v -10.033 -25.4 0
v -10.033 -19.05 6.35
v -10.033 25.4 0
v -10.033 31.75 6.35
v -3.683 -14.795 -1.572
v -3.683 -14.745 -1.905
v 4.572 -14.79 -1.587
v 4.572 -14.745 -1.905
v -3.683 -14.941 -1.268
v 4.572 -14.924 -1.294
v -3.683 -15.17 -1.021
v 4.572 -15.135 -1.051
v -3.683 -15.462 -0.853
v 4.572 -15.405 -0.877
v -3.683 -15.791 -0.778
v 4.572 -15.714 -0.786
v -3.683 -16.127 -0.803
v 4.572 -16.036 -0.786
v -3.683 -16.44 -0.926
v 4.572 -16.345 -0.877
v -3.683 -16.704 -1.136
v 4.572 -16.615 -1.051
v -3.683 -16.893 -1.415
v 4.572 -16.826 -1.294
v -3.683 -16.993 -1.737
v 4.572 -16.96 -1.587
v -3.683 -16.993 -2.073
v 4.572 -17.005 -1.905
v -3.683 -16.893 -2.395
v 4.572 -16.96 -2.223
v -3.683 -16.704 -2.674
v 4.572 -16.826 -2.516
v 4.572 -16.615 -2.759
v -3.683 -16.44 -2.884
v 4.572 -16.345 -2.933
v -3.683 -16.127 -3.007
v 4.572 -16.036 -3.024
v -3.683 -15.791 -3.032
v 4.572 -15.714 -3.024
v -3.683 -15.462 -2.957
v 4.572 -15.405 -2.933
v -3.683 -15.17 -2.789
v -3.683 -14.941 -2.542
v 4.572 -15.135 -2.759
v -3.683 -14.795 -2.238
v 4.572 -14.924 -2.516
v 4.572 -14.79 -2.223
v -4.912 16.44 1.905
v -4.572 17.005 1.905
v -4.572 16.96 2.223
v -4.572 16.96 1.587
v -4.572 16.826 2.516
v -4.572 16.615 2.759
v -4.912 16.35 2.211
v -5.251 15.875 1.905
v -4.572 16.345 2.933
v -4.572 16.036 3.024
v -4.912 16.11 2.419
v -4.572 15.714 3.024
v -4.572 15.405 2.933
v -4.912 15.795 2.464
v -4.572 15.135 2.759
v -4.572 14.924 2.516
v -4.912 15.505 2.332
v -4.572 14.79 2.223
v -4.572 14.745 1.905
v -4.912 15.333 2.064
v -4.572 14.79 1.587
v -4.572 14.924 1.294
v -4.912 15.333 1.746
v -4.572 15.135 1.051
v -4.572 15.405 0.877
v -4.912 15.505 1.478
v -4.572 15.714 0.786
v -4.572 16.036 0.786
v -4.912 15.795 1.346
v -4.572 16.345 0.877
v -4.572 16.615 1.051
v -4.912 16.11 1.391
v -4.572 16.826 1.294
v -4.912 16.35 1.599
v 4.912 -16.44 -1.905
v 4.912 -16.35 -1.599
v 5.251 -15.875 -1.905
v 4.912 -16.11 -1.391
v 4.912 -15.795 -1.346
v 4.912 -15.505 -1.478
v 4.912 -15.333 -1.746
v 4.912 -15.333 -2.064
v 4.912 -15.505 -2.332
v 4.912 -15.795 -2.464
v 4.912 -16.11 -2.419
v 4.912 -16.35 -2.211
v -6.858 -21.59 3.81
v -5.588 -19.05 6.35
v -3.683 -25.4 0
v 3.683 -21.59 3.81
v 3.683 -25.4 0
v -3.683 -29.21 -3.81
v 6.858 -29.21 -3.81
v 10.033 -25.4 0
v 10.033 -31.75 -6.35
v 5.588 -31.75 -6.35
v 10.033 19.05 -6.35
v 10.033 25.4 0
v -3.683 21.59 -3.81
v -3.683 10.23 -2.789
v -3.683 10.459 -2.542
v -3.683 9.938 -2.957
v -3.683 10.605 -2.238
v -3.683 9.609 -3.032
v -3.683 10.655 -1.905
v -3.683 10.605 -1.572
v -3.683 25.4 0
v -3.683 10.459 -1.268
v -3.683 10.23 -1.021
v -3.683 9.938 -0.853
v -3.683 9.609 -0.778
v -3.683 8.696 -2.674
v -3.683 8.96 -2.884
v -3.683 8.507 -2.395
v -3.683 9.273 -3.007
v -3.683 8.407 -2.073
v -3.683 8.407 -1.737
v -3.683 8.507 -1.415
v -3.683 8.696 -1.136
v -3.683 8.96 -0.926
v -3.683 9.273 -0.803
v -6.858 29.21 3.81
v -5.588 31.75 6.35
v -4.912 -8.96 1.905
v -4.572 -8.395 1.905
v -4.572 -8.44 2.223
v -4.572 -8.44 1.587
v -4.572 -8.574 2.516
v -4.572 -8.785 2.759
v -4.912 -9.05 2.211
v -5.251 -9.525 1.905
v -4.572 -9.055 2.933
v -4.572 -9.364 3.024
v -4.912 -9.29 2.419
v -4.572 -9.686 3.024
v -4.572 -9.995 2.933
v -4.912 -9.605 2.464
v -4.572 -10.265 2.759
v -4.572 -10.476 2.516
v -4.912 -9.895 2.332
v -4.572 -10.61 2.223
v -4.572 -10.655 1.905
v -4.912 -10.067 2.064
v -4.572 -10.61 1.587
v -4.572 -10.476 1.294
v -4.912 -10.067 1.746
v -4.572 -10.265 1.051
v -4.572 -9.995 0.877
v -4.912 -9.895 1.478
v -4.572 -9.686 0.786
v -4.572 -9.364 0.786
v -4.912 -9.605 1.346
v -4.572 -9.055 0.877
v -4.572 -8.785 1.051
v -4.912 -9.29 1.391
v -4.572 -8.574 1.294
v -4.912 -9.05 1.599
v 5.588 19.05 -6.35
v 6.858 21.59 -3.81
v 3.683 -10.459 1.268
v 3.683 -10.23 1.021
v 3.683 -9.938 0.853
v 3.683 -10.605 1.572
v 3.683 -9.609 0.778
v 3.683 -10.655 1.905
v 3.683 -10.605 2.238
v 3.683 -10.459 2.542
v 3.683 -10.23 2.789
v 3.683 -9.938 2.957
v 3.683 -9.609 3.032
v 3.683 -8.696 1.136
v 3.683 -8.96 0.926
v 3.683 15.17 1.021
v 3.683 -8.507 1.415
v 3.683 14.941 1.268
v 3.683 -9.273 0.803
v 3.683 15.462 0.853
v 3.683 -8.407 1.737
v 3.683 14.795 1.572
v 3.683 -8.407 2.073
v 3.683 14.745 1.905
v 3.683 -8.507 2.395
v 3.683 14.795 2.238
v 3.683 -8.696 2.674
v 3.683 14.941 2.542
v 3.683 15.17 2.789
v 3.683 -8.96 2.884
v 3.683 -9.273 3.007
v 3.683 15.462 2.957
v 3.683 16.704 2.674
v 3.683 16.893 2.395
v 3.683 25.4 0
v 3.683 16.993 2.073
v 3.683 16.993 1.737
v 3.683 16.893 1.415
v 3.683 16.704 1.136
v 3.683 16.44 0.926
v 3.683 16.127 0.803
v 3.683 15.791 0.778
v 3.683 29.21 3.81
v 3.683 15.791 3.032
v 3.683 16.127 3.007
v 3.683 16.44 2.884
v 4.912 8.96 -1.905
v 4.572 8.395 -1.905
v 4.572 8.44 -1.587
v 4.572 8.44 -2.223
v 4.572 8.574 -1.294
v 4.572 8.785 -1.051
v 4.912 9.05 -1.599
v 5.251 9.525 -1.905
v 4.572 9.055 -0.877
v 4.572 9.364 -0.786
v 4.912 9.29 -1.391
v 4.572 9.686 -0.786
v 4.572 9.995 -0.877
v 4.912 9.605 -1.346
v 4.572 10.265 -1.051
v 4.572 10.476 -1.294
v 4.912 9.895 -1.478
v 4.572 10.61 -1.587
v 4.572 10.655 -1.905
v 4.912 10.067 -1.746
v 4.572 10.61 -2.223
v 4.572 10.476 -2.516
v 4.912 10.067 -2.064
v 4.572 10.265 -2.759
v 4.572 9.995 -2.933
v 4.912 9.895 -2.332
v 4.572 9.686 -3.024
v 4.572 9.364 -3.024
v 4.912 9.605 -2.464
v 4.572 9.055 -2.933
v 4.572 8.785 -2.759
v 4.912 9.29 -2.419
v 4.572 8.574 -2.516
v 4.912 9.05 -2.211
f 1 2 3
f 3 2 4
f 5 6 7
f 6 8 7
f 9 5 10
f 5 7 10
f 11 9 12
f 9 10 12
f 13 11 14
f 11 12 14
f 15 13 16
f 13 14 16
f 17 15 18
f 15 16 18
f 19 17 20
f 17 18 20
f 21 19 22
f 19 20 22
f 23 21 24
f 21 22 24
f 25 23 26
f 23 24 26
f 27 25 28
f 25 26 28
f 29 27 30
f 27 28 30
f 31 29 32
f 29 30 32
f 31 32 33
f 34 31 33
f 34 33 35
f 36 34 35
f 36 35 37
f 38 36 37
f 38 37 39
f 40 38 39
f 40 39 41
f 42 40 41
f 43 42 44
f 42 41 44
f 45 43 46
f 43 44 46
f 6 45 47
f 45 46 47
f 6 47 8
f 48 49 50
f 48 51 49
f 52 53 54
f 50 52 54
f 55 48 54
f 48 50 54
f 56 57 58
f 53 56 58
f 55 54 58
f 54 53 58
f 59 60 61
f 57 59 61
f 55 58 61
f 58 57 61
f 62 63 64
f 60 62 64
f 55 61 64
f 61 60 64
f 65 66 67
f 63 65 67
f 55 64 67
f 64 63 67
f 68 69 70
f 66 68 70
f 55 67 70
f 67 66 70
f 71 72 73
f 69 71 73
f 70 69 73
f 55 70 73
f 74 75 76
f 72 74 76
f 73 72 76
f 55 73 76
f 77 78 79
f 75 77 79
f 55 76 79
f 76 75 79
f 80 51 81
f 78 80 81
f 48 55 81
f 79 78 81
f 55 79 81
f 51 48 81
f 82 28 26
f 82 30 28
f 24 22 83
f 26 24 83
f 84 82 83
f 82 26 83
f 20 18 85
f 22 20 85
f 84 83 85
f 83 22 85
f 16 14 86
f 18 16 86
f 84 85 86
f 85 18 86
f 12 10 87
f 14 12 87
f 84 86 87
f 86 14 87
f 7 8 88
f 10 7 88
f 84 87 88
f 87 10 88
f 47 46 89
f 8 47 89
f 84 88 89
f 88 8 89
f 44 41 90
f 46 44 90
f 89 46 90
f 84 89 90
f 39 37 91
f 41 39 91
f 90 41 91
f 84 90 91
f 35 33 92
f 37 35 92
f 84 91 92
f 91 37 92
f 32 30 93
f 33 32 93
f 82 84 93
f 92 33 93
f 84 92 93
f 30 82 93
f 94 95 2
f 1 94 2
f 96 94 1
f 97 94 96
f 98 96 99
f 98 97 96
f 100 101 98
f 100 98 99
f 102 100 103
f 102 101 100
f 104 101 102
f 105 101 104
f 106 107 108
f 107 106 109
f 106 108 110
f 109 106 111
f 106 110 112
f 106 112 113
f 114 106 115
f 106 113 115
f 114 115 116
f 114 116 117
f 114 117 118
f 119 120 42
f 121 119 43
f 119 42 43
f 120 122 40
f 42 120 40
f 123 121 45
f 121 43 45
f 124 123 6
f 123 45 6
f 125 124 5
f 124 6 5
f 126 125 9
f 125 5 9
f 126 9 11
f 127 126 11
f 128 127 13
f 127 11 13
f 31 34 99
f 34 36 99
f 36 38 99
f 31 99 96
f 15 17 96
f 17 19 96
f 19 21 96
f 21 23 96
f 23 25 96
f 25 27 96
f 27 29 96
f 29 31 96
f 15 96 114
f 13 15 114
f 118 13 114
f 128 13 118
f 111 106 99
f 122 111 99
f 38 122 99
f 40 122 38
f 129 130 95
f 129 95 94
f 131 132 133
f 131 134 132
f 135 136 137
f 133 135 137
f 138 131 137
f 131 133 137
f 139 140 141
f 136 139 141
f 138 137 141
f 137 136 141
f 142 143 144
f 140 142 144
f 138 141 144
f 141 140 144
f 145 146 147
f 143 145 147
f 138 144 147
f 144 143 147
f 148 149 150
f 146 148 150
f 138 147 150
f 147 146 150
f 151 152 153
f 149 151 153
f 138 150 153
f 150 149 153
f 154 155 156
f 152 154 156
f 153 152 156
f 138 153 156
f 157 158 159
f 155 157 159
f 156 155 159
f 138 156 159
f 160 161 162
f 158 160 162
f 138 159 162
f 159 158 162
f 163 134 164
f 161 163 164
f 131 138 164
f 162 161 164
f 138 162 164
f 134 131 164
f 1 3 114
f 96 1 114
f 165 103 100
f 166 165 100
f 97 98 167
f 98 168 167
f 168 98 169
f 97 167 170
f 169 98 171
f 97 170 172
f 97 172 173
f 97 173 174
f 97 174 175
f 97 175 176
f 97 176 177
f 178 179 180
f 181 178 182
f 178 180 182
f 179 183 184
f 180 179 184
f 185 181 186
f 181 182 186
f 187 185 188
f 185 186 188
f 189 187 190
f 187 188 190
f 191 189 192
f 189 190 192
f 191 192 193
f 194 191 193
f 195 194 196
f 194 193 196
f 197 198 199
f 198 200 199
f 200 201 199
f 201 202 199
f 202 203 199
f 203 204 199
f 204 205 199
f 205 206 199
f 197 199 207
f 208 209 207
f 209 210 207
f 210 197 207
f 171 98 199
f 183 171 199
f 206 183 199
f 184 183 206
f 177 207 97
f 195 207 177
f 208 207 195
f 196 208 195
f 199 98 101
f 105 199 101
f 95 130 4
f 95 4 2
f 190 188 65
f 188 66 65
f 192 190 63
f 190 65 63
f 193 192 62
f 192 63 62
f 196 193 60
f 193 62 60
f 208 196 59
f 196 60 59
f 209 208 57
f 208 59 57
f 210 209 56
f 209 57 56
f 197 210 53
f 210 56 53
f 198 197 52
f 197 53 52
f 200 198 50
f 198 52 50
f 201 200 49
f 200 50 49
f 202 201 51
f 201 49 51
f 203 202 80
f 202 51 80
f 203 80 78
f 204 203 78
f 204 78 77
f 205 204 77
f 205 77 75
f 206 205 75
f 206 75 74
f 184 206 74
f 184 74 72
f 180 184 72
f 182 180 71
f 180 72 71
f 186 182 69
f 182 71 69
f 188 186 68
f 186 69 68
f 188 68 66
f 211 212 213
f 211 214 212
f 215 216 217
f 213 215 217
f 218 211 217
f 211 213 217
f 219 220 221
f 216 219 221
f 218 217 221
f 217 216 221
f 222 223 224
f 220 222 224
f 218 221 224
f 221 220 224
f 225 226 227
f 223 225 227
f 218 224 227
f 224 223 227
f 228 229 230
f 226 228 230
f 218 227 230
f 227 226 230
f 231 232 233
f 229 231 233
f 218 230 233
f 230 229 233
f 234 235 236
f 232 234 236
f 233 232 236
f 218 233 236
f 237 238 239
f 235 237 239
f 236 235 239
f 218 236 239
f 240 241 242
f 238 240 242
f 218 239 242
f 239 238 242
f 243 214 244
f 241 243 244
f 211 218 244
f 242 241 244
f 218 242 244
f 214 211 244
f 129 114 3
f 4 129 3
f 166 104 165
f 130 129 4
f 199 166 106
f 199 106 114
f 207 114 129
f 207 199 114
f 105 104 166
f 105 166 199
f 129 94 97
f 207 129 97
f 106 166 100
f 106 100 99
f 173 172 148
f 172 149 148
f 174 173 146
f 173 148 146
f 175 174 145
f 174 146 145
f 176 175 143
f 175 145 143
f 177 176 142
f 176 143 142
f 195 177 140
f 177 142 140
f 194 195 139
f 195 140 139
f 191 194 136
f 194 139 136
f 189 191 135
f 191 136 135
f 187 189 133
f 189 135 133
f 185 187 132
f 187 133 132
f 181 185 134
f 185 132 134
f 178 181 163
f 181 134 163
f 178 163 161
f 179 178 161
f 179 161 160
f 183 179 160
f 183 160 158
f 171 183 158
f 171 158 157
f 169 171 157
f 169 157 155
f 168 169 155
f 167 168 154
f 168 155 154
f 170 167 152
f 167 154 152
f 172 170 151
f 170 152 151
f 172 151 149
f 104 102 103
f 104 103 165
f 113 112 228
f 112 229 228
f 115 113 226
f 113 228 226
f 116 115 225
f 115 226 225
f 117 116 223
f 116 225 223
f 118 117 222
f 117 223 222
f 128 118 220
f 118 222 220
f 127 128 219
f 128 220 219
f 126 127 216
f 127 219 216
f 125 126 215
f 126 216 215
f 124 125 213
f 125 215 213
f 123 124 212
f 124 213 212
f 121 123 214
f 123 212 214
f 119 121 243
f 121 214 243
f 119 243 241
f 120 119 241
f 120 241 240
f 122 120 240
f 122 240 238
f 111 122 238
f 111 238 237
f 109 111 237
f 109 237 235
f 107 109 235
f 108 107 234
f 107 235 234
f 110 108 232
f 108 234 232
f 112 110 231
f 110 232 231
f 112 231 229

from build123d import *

# Parameters (mm, degrees)
F1_DEPTH = 10.033
F3_DEPTH = 76.2
F4_W     = 6.35
F4_H     = 6.35
F5_DEPTH = 76.2
F7_D     = 2.2606
F7_DEPTH = 8.255
F7_TIP   = 0.6791527577
F9_D     = 2.2606
F9_DEPTH = 8.255
F9_TIP   = 0.6791527577


with BuildPart() as f1:
    # F0 (on Right) → F1 (new body, symmetric)
    with BuildSketch(Plane.YZ):
        Polygon((19.05, -6.35), (31.75, 6.35), (-19.05, 6.35), (-31.75, -6.35), align=None)
    extrude(amount=F1_DEPTH, both=True)

    # F2 (on Front) → F3 (cut, symmetric)
    with BuildSketch(Plane.XZ):
        Polygon((-6.858, -3.81), (-5.588, -6.35), (5.588, -6.35), (6.858, -3.81), align=None)
        Polygon((5.588, 6.35), (-5.588, 6.35), (-6.858, 3.81), (6.858, 3.81), align=None)
    extrude(amount=F3_DEPTH, both=True, mode=Mode.SUBTRACT)

    # F4 (on Front) → F5 (cut, symmetric)
    with BuildSketch(Plane.XZ):
        with Locations((6.858, 3.175)):
            Rectangle(F4_W, F4_H)
        with Locations((-6.858, -3.175)):
            Rectangle(F4_W, F4_H)
    extrude(amount=F5_DEPTH, both=True, mode=Mode.SUBTRACT)

    # F7
    with Locations(Plane.YZ.offset(3.683)):
        with Locations((-9.525, 1.905), (15.875, 1.905)):
            Hole(F7_D / 2, depth=F7_DEPTH)
            with Locations((0, 0, -(F7_DEPTH + F7_TIP / 2))):  # 118° drill point
                Cone(0, F7_D / 2, F7_TIP, mode=Mode.SUBTRACT)

    # F9
    with Locations(Plane(origin=(-3.683, 0, 0), x_dir=(0, -1, 0), z_dir=(-1, 0, 0))):
        with Locations((-9.525, -1.905), (15.875, -1.905)):
            Hole(F9_D / 2, depth=F9_DEPTH)
            with Locations((0, 0, -(F9_DEPTH + F9_TIP / 2))):  # 118° drill point
                Cone(0, F9_D / 2, F9_TIP, mode=Mode.SUBTRACT)


solid = f1.part
